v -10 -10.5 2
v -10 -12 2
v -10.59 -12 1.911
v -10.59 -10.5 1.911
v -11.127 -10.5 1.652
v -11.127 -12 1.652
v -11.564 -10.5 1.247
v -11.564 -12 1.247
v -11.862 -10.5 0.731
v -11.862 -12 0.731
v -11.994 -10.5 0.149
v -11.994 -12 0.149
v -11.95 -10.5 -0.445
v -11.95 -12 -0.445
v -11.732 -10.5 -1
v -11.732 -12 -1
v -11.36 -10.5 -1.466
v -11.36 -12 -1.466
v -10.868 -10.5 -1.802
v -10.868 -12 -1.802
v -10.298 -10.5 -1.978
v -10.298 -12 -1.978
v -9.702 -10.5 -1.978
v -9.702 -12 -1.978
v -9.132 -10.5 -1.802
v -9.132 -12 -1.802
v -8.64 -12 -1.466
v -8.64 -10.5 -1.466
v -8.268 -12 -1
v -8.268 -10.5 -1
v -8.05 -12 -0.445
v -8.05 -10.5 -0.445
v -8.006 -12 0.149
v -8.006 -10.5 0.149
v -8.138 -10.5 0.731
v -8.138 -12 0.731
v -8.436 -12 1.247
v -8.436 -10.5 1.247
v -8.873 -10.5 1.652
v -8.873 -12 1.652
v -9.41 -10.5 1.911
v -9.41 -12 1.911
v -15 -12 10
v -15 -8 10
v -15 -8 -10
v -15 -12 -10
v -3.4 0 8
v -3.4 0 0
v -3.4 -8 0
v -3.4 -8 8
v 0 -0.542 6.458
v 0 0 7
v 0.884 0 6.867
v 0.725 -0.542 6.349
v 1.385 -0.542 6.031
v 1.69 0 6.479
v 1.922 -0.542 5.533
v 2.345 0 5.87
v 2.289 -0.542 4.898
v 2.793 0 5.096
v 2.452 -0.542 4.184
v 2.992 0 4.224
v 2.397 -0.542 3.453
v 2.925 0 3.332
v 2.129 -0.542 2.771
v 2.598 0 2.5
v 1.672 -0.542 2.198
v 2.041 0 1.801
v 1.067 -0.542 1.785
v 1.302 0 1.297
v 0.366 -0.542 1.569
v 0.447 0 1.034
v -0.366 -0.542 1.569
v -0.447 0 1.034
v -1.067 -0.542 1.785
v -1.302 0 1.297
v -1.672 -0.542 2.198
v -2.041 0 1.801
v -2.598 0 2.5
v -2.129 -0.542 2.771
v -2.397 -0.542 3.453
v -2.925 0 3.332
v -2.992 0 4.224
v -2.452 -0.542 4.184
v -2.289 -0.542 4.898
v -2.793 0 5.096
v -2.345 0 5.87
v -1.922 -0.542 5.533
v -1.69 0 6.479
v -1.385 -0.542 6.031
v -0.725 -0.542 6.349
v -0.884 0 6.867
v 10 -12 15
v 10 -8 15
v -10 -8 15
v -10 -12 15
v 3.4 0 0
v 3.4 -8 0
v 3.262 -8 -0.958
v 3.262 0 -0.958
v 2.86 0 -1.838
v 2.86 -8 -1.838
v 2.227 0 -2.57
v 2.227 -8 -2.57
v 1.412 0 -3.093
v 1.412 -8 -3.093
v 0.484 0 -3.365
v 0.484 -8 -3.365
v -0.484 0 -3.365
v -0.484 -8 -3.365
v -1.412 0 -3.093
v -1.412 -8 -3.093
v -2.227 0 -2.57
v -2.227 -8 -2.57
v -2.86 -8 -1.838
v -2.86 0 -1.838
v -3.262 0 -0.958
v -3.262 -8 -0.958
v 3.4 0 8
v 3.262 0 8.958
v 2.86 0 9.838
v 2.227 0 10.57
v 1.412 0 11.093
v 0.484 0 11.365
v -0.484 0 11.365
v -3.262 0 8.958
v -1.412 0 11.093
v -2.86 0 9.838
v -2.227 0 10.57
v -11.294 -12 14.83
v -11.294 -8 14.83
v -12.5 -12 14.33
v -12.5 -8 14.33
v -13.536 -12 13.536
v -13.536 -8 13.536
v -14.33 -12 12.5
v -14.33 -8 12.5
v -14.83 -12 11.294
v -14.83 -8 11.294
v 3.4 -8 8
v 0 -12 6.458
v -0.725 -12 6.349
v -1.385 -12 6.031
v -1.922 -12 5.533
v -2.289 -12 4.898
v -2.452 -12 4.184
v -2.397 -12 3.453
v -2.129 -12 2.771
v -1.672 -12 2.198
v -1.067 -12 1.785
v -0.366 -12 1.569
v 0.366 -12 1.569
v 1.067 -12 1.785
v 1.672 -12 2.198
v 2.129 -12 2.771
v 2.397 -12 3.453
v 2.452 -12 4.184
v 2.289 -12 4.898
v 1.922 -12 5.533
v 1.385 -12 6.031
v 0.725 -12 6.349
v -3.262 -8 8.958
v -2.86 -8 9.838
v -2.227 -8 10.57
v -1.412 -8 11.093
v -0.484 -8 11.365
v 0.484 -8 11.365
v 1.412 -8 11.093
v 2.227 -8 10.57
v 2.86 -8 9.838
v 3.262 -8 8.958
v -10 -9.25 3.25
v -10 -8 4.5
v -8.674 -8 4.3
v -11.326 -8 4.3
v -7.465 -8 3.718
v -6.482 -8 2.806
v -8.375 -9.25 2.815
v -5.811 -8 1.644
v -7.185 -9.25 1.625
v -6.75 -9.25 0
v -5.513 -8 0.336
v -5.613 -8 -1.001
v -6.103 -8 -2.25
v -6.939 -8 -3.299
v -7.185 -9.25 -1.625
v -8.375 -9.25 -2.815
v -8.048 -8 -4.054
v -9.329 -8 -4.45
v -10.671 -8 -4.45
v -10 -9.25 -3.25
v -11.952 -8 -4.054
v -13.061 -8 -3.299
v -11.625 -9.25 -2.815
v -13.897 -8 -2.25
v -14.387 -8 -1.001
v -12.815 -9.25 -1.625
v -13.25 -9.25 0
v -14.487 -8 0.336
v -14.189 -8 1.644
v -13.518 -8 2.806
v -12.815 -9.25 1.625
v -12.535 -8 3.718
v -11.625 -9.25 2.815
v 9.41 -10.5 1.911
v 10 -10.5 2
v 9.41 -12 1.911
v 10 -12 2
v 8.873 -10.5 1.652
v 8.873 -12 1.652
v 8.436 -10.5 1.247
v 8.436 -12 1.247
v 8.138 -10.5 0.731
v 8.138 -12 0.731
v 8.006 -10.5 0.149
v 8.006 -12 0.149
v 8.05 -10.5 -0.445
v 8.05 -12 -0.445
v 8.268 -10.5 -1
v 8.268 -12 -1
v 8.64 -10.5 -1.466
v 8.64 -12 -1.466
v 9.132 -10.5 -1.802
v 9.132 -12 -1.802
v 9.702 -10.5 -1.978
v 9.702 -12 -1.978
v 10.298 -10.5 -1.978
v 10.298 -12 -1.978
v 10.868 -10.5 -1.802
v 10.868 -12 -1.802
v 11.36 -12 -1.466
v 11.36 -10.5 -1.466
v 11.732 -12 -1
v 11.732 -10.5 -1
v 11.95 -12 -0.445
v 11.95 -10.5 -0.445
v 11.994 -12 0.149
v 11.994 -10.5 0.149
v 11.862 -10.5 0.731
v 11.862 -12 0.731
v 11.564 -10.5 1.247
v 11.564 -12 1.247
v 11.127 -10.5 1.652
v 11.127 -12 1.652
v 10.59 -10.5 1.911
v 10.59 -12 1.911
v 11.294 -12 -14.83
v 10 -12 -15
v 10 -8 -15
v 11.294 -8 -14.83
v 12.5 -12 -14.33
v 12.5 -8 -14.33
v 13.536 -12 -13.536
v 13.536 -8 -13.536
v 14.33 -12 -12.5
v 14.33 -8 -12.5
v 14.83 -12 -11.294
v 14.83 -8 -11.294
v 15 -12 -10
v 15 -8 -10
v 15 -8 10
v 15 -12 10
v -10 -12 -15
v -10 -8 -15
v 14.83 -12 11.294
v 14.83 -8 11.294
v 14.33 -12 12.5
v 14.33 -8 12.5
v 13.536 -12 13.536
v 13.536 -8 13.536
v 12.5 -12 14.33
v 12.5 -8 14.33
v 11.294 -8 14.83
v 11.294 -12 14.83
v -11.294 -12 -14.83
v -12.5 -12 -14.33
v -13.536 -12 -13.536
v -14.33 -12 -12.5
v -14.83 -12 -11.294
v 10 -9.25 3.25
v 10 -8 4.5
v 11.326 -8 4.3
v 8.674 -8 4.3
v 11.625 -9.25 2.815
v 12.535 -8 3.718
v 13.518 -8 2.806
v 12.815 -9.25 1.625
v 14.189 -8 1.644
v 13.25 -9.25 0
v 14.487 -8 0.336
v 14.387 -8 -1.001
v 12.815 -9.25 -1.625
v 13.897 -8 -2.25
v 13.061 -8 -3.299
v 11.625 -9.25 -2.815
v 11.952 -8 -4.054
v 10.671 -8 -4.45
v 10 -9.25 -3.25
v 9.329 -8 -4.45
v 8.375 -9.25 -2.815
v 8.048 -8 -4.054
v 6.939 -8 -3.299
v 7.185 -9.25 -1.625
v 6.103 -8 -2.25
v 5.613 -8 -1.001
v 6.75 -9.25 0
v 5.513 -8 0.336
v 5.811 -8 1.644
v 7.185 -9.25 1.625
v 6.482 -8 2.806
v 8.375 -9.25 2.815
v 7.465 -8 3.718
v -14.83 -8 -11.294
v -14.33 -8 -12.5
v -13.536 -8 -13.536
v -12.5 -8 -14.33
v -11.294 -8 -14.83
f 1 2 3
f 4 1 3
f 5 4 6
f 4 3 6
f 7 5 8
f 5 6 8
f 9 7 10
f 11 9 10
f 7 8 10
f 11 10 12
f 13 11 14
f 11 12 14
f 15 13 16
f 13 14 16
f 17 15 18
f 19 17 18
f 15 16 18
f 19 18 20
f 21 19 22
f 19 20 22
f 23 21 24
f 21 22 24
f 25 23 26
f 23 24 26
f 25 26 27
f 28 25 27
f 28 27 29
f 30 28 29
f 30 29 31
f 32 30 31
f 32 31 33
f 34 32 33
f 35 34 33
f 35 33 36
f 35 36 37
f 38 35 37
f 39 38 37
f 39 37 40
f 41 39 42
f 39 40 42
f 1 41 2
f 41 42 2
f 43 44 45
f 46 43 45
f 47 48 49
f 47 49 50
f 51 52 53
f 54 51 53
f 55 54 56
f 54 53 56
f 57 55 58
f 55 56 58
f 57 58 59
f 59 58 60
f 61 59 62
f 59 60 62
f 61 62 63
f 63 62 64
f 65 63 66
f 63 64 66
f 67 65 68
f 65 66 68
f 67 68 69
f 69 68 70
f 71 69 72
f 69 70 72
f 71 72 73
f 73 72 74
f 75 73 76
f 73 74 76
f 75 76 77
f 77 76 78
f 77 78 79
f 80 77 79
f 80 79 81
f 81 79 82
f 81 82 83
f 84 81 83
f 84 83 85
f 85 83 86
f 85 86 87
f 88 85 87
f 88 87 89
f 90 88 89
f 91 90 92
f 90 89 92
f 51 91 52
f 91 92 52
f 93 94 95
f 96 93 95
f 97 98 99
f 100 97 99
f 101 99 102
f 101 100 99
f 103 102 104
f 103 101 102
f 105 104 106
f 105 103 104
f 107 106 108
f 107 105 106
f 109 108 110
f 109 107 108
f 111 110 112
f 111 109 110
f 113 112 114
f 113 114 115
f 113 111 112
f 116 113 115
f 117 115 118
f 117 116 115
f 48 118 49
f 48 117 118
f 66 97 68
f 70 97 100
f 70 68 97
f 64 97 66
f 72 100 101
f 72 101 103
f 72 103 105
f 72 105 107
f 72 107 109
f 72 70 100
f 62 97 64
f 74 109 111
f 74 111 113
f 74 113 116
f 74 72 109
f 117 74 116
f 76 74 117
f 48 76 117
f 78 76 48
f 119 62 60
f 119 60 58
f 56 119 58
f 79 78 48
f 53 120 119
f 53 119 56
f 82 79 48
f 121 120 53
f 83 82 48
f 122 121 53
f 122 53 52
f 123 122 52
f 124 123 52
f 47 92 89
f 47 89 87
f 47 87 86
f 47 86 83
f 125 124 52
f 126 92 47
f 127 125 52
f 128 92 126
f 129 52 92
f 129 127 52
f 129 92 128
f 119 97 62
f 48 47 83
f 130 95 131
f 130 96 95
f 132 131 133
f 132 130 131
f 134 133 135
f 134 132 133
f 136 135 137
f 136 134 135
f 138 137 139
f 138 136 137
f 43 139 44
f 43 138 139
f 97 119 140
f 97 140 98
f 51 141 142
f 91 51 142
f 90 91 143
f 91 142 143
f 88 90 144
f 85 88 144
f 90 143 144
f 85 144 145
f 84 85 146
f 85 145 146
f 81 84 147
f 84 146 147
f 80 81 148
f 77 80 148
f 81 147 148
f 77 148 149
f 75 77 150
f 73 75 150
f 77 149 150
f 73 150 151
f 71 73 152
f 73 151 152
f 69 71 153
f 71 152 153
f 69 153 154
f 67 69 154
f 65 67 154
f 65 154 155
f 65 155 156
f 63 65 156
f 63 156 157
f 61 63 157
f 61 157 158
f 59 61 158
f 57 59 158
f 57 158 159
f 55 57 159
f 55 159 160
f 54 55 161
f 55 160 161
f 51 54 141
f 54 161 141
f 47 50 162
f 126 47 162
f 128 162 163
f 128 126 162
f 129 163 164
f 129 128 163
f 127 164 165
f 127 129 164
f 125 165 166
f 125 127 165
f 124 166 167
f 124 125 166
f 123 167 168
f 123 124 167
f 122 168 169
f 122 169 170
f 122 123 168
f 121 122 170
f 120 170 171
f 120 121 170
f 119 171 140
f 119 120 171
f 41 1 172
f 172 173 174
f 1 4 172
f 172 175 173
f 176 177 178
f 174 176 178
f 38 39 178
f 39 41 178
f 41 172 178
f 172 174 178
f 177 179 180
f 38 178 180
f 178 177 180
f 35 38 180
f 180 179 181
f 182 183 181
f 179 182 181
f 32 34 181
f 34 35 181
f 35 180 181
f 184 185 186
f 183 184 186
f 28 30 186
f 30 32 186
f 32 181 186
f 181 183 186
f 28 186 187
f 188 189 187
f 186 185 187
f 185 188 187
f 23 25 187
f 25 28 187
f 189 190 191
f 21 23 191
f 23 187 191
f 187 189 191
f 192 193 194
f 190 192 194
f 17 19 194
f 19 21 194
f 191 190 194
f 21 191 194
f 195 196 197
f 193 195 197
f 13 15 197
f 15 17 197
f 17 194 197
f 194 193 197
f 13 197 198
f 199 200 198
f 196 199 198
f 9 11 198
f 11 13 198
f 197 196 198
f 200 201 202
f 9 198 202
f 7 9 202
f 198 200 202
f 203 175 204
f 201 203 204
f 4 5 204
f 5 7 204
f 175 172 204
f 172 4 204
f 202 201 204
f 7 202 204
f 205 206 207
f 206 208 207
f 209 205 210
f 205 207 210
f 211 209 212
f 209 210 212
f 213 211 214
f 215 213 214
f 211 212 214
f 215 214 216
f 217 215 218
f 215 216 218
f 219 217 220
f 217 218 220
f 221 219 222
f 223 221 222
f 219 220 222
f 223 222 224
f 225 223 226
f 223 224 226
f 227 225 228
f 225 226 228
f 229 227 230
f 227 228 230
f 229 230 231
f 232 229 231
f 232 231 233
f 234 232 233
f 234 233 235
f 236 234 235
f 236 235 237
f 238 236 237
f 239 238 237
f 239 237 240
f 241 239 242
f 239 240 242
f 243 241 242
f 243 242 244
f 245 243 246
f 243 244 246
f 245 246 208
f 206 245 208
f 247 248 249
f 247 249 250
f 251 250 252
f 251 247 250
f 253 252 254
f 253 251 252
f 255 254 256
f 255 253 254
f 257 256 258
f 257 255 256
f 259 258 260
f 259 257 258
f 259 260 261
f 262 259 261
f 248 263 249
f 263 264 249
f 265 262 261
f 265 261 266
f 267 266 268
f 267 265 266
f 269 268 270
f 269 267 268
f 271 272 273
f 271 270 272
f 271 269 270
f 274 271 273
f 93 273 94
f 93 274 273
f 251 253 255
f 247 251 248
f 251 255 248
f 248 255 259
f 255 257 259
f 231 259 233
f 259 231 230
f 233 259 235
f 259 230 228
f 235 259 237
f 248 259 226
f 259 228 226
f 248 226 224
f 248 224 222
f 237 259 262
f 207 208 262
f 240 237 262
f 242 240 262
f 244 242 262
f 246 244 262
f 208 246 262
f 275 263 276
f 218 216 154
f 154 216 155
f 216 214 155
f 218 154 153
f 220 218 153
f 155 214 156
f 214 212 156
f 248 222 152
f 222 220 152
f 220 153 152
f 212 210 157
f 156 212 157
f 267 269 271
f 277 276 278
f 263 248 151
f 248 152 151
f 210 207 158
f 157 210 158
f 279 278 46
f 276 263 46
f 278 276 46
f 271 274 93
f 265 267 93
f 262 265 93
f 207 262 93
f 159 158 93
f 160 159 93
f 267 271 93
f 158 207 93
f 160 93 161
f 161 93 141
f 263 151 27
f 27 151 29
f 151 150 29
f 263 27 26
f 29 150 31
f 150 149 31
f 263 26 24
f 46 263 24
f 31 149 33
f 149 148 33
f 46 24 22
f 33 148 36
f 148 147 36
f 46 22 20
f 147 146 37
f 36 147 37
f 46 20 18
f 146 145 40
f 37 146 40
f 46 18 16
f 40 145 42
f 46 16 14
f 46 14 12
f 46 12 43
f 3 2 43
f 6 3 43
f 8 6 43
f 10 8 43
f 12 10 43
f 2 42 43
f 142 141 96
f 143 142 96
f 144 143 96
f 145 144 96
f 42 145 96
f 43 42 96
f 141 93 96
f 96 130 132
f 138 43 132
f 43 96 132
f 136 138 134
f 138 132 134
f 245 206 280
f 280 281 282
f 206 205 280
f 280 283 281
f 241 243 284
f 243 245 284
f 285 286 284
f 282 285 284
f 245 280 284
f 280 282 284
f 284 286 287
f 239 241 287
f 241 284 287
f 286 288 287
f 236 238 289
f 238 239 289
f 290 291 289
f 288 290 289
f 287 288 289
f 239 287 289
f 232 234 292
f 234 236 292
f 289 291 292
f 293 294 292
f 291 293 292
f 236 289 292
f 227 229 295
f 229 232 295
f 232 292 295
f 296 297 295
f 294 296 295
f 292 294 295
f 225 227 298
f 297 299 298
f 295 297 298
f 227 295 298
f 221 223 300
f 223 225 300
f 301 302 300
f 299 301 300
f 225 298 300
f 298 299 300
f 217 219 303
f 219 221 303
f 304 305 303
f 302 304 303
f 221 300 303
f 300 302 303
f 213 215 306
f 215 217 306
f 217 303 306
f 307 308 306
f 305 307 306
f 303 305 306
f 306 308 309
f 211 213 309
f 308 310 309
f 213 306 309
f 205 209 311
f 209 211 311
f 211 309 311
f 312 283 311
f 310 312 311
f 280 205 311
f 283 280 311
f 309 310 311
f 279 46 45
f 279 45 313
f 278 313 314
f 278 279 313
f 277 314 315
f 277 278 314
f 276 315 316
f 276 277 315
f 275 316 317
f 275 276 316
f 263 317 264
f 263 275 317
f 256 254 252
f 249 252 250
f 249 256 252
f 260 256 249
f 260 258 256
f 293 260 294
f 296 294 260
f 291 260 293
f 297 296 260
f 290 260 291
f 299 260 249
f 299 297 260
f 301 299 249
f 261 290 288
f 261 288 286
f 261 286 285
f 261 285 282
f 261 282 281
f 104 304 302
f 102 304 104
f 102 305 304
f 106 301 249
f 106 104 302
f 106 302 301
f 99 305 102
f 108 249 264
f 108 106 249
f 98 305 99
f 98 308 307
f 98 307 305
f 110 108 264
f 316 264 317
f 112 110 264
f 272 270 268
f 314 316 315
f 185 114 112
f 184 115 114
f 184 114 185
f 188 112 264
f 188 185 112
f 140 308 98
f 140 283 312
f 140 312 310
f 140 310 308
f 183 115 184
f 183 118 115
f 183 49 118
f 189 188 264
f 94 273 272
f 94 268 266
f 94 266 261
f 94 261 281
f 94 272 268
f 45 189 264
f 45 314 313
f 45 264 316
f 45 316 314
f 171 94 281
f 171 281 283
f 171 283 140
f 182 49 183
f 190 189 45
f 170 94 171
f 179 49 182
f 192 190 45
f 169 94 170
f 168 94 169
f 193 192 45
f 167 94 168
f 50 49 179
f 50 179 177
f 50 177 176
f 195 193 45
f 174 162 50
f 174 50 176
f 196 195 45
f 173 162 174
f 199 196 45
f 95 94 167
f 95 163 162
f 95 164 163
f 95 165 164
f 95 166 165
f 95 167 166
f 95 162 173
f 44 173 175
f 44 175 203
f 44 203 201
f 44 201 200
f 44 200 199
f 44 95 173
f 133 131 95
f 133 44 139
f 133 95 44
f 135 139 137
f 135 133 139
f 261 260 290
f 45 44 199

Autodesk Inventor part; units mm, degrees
ref_plane "YZ Plane" through (0, 0, 0) normal (1, 0, 0) x (0, 1, 0)
ref_plane "XZ Plane" through (0, 0, 0) normal (0, 1, 0) x (-1, 0, 0)
ref_plane "XY Plane" through (0, 0, 0) normal (0, 0, 1) x (1, 0, 0)
sketch "Sketch1" plane through (0, 0, 0) normal (0, 1, 0) x (-1, 0, 0)
  line L0 (-15, 15) -> (15, 15)
  line L1 (15, 15) -> (15, -15)
  line L2 (15, -15) -> (-15, -15)
  line L3 (-15, -15) -> (-15, 15)
  line L4 (-15, 15) -> (15, -15) construction
  line L5 (15, 15) -> (-15, -15) construction
  line L6 (21, 0) -> (-21, 0) construction
  line L7 (0, -21) -> (0, 21) construction
  line L8 (0, 8) -> (0, 0) construction
  line L9 (-3.4, 8) -> (-3.4, 0)
  line L10 (3.4, 0) -> (3.4, 8)
  arc A0 (3.4, 8) -> (-3.4, 8) centre (0, 8) ccw
  arc A1 (-3.4, 0) -> (3.4, 0) centre (0, 0) ccw
  point P0 (0, 0)
  point P1 (0, 4)
  point P2 (10, 0)
  point P3 (-10, 0)
  point P4 (0, 4)
  dimension "d0" = 30
  dimension "d1" = 30
  dimension "d2" = 6.8
  dimension "d3" = 8
  dimension "d4" = 0
  dimension "d5" = 20
extrude "Extrusion1" add sketch "Sketch1" against normal blind 12 contours L0 L1 L2 L3 | A0 L10 A1 L9
extrude "Extrusion2" cut sketch "Sketch1" against normal blind 8
hole "Hole1" at (0, 0, 4) direction (0, -1, 0) diameter 4.917 end through all countersink diameter 6 countersink angle 90 thread size "M6x1" class "6H" standard "ISO Metric profile"
sketch "Sketch2" plane through (0, -8, 0) normal (0, 1, 0) x (1, 0, 0)
  point P0 (0, 0)
  point P1 (10, 0)
  point P2 (-10, 0)
hole "Hole2" at (10, -8, 0) at (-10, -8, 0) direction (0, -1, 0) diameter 4 end through all countersink diameter 9 countersink angle 90
fillet "Fillet1" radius 5 4 edges at (-15, -10, -15) (-15, -10, 15) (15, -10, 15) (15, -10, -15)
properties part number "TCSM1-004" material "Steel"
